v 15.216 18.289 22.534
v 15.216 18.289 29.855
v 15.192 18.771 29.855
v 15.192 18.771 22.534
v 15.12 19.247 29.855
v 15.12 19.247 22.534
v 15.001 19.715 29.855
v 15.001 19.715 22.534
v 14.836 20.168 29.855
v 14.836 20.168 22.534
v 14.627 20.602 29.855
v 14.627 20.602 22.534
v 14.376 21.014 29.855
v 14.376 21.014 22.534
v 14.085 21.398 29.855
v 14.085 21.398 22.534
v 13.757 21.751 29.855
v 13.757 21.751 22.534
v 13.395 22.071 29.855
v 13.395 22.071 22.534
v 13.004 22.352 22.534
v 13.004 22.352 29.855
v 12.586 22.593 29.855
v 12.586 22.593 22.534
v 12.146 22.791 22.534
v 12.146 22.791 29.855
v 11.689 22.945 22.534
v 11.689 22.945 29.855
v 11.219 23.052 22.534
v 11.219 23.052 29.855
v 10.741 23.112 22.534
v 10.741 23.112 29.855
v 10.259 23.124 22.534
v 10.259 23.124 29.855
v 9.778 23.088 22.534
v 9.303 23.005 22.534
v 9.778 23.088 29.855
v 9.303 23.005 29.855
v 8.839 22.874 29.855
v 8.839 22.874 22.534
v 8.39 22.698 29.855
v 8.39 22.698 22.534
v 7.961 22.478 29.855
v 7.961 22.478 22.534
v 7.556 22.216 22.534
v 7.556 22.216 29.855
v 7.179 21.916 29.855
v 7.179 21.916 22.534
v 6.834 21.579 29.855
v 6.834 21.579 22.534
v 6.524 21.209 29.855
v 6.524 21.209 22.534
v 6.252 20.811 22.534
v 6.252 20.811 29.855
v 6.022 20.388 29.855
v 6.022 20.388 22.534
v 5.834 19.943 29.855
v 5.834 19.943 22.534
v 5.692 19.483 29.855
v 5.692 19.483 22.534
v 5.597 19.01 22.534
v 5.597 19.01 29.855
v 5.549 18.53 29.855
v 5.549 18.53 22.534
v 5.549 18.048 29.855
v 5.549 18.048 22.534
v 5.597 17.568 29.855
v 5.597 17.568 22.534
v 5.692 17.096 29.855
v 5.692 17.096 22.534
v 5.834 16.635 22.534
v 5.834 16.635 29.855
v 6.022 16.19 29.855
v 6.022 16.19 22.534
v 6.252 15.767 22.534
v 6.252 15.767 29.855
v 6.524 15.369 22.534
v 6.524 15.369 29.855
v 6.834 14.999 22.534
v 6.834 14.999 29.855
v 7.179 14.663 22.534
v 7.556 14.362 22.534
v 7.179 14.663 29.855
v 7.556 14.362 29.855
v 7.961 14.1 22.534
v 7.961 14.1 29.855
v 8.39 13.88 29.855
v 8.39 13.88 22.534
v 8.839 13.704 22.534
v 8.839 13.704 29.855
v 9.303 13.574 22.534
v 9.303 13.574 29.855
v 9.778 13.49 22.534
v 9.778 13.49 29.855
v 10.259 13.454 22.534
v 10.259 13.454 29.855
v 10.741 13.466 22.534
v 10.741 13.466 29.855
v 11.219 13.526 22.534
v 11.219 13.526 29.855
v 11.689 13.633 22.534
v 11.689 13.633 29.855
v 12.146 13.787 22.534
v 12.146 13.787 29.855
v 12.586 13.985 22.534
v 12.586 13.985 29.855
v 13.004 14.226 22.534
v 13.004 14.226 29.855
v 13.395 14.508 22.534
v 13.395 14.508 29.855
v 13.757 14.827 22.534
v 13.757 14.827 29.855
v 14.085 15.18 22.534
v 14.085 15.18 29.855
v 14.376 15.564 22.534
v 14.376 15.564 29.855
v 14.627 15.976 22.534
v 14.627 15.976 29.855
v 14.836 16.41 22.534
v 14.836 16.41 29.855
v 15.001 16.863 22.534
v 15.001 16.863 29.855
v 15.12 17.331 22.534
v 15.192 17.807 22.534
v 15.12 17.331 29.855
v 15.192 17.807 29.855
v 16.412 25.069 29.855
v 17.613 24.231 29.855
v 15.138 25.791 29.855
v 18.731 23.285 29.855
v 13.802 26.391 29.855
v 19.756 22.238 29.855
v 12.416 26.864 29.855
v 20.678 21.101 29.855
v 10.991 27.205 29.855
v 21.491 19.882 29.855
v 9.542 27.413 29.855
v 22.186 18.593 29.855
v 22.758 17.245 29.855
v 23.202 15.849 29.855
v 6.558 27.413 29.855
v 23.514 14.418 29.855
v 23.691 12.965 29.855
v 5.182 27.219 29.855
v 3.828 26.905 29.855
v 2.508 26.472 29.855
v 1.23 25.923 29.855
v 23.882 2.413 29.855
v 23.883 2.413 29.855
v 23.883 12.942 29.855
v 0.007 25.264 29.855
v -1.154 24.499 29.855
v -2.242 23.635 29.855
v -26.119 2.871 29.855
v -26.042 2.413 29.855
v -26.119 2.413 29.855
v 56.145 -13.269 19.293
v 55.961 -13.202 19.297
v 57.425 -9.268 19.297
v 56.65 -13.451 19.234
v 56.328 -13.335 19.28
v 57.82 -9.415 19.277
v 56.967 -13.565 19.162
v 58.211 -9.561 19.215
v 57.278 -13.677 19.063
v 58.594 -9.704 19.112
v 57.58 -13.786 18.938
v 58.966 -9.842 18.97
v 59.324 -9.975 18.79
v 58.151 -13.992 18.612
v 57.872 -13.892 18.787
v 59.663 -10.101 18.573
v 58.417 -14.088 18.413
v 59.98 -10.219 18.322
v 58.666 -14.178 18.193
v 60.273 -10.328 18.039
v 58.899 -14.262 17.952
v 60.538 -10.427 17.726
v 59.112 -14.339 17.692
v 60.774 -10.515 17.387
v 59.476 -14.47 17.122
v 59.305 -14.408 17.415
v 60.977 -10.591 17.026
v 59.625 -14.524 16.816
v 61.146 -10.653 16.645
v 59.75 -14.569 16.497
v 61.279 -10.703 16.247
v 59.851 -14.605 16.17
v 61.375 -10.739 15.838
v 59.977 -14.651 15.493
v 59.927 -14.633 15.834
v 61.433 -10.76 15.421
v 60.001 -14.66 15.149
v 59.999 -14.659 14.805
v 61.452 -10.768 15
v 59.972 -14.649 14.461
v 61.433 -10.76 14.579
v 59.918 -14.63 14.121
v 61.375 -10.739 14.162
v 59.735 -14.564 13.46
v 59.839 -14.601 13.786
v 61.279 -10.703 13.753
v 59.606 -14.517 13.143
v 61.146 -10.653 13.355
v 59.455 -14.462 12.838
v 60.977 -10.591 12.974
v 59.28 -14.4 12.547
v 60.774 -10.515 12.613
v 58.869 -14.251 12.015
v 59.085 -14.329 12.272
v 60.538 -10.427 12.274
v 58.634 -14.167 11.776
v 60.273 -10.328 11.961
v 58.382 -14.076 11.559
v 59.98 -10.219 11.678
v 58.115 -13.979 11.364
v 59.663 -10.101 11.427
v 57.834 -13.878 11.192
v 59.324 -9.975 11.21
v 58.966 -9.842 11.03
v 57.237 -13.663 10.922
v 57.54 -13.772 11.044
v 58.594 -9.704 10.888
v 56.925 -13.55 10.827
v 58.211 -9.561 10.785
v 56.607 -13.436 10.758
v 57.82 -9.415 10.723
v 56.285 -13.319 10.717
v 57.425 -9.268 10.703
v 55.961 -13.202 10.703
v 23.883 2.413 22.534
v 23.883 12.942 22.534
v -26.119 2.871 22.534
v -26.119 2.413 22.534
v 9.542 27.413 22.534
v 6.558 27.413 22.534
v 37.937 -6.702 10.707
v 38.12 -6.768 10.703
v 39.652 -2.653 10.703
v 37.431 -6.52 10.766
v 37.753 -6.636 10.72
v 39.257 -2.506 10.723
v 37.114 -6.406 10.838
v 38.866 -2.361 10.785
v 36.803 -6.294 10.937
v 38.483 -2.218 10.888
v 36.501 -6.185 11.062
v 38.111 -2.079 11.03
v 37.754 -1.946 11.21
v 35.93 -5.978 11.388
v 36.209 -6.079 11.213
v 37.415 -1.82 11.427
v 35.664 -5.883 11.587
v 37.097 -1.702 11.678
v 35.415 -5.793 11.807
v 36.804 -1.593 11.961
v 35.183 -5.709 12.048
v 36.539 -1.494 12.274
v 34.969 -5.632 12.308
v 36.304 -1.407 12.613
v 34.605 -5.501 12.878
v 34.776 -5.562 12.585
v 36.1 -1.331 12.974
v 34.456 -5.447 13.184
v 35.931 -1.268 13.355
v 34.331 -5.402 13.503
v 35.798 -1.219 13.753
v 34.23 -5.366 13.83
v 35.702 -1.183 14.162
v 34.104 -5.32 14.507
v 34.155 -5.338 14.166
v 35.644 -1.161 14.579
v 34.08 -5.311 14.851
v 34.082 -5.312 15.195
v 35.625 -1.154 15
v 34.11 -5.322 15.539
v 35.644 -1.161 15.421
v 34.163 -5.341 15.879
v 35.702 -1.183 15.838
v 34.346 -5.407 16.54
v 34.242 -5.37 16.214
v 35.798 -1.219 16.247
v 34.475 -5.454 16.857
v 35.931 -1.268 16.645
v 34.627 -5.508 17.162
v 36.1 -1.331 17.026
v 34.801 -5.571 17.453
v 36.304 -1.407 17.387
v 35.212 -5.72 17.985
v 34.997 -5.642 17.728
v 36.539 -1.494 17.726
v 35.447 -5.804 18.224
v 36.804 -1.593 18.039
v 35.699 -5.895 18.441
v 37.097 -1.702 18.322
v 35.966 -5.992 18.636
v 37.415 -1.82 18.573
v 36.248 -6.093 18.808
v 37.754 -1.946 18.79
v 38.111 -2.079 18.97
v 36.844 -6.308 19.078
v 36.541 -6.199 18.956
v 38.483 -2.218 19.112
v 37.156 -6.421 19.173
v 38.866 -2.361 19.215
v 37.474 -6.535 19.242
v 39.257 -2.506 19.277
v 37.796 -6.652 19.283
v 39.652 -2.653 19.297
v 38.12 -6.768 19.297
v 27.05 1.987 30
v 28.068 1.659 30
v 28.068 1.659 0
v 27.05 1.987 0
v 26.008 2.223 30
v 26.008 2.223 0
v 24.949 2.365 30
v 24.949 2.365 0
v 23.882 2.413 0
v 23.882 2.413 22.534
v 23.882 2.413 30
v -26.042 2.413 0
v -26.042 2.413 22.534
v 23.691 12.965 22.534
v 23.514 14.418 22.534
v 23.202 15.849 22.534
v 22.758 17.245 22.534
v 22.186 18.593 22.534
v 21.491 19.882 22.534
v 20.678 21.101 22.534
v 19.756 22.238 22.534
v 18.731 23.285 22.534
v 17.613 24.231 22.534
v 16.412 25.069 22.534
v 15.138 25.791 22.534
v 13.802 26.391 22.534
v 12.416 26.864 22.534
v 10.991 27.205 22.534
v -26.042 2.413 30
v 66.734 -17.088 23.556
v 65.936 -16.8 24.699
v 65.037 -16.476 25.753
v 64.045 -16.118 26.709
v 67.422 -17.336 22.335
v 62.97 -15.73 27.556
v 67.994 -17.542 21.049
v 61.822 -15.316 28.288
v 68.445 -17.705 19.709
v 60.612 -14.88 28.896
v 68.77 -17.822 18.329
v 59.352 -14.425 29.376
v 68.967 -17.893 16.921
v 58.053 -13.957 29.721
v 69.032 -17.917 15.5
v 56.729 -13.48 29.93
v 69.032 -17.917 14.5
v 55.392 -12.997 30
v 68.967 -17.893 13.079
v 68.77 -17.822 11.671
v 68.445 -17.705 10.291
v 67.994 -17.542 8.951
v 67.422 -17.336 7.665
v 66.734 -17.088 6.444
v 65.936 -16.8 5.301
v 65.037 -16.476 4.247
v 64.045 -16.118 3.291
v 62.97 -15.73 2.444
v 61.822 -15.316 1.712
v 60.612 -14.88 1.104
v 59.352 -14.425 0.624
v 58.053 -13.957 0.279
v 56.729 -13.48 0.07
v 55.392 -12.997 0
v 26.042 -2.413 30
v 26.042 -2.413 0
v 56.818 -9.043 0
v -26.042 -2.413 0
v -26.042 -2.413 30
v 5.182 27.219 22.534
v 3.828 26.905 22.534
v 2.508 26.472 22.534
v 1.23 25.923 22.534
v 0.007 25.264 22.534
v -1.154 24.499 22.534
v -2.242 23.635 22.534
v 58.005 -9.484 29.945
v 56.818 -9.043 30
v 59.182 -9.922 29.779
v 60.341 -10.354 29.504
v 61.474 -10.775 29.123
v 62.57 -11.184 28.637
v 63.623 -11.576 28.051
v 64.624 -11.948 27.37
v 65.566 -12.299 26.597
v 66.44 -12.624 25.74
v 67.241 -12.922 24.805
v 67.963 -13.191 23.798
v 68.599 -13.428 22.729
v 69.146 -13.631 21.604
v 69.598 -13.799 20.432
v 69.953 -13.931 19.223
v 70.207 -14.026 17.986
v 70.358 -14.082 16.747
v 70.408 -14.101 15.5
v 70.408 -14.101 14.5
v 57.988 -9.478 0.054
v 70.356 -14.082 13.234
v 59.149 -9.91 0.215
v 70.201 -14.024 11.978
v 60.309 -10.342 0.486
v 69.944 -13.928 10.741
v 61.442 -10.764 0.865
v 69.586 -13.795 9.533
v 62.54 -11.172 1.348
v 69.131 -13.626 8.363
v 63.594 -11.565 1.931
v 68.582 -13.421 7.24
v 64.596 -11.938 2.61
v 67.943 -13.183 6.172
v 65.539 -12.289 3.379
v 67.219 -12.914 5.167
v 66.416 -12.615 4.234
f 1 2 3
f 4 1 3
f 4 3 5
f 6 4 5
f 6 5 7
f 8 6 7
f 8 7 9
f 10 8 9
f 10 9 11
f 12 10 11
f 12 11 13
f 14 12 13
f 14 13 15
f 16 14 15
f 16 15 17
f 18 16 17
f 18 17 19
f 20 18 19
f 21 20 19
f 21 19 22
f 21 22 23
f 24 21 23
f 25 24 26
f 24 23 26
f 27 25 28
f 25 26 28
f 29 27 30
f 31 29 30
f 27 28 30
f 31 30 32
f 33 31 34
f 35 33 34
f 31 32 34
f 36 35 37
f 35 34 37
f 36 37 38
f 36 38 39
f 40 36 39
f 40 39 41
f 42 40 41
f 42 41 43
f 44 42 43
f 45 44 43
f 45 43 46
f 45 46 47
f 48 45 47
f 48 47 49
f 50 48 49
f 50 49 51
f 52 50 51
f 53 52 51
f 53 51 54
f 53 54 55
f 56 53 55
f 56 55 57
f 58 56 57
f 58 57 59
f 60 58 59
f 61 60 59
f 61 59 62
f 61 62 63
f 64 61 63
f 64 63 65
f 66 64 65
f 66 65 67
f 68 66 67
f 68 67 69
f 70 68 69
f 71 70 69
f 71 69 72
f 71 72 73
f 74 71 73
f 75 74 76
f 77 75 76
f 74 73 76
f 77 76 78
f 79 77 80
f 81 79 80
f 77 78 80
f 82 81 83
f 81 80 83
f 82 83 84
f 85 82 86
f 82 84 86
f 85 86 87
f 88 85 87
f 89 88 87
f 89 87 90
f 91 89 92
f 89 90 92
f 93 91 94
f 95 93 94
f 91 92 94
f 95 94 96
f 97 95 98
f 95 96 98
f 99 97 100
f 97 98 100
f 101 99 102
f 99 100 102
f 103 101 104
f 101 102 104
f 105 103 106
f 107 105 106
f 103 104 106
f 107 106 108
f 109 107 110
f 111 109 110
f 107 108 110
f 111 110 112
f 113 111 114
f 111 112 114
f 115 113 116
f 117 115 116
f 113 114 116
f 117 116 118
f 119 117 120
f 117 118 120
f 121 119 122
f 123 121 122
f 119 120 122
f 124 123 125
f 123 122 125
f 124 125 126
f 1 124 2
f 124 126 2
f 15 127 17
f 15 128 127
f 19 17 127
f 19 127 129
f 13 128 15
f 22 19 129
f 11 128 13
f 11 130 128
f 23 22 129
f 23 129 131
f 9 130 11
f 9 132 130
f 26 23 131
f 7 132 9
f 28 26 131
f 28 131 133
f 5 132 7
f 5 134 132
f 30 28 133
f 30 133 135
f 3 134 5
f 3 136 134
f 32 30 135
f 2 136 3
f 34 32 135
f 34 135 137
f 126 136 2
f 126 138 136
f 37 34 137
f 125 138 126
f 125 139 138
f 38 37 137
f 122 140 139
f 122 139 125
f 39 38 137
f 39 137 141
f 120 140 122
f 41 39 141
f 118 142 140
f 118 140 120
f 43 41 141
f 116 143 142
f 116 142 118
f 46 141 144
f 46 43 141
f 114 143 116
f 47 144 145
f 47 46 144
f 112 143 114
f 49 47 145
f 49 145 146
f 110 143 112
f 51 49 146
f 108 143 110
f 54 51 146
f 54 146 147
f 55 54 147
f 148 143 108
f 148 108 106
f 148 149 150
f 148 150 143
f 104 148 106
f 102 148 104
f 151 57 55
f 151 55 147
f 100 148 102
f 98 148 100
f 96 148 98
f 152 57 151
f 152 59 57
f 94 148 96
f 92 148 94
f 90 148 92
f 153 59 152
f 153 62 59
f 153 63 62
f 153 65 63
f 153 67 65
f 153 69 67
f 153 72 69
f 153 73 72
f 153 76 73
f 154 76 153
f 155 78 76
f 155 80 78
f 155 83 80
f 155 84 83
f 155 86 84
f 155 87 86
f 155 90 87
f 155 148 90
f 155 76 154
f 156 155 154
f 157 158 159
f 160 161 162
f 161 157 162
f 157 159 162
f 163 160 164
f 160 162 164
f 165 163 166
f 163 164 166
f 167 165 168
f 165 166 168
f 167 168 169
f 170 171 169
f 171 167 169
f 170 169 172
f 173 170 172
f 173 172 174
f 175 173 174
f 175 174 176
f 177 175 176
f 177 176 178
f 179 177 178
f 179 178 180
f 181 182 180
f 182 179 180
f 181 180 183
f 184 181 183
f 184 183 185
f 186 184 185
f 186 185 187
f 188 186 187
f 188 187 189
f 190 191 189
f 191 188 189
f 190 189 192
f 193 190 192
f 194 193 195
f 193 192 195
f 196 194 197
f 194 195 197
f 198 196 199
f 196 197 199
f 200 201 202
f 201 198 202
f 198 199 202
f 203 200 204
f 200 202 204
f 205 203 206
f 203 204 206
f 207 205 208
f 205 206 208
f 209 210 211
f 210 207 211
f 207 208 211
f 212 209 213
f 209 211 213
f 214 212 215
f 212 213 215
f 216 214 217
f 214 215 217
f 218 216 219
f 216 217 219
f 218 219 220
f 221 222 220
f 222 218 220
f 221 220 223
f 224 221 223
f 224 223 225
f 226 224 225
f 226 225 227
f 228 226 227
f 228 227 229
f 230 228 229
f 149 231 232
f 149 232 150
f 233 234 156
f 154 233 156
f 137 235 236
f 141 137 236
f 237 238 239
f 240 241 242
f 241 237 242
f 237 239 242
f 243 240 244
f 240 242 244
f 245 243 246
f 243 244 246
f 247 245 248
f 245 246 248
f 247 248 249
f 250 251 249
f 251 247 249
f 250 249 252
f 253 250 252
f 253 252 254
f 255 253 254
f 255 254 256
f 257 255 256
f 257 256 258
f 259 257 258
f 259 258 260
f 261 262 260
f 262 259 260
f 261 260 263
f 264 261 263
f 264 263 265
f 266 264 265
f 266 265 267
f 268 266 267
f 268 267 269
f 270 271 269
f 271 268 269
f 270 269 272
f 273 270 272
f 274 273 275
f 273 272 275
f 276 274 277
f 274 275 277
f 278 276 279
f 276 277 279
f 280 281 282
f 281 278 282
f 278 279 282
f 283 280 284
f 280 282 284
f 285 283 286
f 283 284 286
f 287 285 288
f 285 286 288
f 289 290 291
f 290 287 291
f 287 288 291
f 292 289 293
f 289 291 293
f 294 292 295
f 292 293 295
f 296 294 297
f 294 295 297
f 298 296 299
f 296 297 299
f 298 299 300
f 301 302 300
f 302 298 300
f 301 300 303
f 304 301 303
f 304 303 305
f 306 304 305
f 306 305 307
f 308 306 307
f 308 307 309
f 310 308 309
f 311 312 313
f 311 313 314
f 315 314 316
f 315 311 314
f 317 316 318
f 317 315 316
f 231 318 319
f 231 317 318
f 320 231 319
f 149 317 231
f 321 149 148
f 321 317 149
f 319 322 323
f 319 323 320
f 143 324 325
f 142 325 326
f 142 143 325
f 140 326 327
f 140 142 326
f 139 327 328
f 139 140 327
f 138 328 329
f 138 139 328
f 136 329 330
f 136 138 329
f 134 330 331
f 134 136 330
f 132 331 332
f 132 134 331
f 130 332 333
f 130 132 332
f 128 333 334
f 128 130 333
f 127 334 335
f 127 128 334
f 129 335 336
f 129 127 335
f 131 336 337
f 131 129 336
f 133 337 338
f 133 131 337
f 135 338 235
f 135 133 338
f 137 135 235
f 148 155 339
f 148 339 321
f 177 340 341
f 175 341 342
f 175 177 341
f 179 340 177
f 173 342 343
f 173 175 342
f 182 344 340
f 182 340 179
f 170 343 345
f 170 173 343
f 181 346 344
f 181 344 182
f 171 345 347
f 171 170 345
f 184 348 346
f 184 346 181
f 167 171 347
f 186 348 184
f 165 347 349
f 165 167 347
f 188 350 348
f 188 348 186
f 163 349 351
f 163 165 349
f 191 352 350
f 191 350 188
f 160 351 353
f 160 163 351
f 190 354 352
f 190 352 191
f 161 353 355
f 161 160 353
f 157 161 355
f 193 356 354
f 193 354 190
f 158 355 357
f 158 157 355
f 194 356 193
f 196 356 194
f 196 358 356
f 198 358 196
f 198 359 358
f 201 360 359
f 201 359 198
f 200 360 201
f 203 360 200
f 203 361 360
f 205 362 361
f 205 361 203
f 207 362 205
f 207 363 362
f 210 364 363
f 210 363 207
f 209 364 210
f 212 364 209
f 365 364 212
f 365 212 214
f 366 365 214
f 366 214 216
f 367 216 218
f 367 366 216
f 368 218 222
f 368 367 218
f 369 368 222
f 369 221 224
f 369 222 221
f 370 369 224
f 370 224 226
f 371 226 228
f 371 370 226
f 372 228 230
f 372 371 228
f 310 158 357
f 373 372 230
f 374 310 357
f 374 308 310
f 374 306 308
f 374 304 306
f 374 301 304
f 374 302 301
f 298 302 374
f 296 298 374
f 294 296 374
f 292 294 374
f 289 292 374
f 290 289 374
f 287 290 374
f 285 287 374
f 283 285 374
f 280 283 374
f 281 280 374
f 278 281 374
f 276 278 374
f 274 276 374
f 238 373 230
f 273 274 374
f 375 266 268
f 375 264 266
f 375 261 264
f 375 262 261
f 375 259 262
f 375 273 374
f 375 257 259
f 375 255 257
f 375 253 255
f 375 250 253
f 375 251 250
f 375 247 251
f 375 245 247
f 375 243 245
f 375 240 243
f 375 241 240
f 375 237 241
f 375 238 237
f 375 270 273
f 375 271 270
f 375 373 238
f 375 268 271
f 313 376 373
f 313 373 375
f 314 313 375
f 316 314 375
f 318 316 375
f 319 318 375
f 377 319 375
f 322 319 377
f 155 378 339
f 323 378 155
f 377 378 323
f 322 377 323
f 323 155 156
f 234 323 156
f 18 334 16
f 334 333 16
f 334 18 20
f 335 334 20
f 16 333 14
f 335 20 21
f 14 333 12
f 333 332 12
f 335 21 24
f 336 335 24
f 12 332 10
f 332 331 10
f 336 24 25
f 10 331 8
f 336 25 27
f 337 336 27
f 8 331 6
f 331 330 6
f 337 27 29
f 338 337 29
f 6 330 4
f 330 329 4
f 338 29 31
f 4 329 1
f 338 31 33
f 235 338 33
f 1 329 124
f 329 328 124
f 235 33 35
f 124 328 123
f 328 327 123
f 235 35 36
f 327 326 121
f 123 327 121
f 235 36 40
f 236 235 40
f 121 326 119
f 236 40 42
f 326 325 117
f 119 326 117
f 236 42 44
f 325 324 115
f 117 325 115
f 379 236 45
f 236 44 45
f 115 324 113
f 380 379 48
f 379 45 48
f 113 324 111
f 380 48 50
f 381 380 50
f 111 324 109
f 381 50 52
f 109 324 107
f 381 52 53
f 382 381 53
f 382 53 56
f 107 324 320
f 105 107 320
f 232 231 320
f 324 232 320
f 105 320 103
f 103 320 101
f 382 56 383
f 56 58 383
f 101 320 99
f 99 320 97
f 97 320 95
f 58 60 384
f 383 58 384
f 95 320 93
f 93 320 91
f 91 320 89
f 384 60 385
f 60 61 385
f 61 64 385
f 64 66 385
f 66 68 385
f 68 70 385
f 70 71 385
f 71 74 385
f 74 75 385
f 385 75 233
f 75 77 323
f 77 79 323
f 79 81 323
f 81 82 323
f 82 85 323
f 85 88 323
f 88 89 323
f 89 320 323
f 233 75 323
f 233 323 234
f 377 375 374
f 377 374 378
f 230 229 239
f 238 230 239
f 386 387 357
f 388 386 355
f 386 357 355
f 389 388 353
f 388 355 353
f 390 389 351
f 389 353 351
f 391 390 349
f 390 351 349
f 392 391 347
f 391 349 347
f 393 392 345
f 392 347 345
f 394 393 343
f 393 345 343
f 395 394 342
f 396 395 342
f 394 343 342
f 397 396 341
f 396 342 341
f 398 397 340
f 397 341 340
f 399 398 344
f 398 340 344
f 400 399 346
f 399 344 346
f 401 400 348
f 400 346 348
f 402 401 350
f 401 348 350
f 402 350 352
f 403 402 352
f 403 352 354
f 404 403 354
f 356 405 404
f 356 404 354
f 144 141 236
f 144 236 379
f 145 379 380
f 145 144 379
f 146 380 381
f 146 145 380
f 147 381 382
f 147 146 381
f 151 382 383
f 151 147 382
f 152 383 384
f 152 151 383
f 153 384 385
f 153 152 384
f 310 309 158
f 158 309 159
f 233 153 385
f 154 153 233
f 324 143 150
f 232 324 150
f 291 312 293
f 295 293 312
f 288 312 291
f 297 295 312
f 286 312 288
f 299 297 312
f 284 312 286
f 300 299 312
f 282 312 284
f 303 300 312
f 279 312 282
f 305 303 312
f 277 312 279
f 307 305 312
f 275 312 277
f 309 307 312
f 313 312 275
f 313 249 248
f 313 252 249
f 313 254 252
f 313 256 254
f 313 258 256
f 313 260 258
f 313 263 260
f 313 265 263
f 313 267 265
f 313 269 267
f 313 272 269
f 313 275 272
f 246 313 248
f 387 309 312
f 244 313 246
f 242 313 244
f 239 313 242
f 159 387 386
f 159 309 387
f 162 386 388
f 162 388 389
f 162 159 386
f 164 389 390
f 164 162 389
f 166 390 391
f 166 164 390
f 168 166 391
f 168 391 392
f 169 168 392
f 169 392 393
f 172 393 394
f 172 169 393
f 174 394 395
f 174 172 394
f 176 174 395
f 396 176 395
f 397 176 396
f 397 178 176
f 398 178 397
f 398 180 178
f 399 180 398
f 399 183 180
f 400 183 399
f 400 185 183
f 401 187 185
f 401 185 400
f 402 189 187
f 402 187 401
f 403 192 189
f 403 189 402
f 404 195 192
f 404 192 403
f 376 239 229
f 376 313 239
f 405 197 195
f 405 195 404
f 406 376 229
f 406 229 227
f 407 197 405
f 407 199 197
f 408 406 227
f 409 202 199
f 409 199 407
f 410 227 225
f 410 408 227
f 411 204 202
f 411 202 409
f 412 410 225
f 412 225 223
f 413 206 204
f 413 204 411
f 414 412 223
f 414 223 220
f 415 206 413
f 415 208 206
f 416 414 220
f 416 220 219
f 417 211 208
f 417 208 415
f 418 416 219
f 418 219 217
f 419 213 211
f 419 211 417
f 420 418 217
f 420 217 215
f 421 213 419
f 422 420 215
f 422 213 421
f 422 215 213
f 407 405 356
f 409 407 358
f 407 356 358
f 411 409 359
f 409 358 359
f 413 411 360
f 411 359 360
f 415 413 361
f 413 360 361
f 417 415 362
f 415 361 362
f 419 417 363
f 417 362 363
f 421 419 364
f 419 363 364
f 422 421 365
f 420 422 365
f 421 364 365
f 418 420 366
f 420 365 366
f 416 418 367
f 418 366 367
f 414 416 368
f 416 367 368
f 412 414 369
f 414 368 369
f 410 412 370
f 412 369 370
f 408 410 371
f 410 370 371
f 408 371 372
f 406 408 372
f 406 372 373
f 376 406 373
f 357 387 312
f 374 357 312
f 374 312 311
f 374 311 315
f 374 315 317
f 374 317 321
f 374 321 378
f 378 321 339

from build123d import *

# Parameters (mm, degrees)
PAD_DEPTH       = 30
POCKET_DEPTH    = 5
FILLET_R        = 14.5
FILLET001_R     = 14.5
FILLET002_R     = 12
SKETCH002_W     = 50.00223
SKETCH002_H     = 7.321129
PAD001_DEPTH    = 25
SKETCH003_R     = 4.8367523299
POCKET001_DEPTH = 10


with BuildPart() as part:
    # Sketch → Pad (new body)
    with BuildSketch(Plane.XY):
        Polygon((-26.0423896161, -2.4126467386), (-26.0423896161, 2.4126467386), (26.0423896161, 2.4126467386), (70.4083759206, -14.101078257), (69.0323338509, -17.9166155839), (26.0423896161, -2.4126467386), align=None)
    extrude(amount=PAD_DEPTH)

    # Sketch001 (on Face3 of Pad) → Pocket (cut)
    with BuildSketch(Plane(origin=(3.9577363848, 10.6329055553, 0), x_dir=(-0.9371842108, 0.3488348534, 0), z_dir=(0.3488348534, 0.9371842108, 0))):
        with BuildLine():
            ThreePointArc((-57.051074, 19.2972875988), (-61.3483615988, 15), (-57.051074, 10.7027124012))
            Line((-57.051074, 10.7027124012), (-38.086853, 10.7027124012))
            ThreePointArc((-38.086853, 10.7027124012), (-33.7895654012, 15), (-38.086853, 19.2972875988))
            Line((-38.086853, 19.2972875988), (-57.051074, 19.2972875988))
        make_face()
    extrude(amount=-POCKET_DEPTH, mode=Mode.SUBTRACT)

    # Fillet
    fillet_edges = [part.edges().sort_by_distance(p)[0] for p in [
        (69.720355, -16.008847, 30),
    ]]
    fillet(fillet_edges, radius=FILLET_R)

    # Fillet001
    fillet001_edges = [part.edges().sort_by_distance(p)[0] for p in [
        (69.720355, -16.008847, 0),
    ]]
    fillet(fillet001_edges, radius=FILLET001_R)

    # Fillet002
    fillet002_edges = [part.edges().sort_by_distance(p)[0] for p in [
        (26.04239, 2.412647, 15),
    ]]
    fillet(fillet002_edges, radius=FILLET002_R)

    # Sketch002 (on Face12 of Fillet002) → Pad001 (join)
    with BuildSketch(Plane(origin=(0, 2.4126467386, 0), x_dir=(-1, 0, 0), z_dir=(0, 1, 0))):
        with Locations((1.1177492, 26.194347)):
            Rectangle(SKETCH002_W, SKETCH002_H)
    extrude(amount=PAD001_DEPTH)

    # Sketch003 (on Face17 of Pad001) → Pocket001 (cut)
    with BuildSketch(Plane.XY.offset(29.8549115)):
        with Locations((10.379424, 18.289026)):
            Circle(SKETCH003_R)
        with BuildLine():
            Line((-30.0109383074, -0.5137681689), (-30.0109383074, 32.26572))
            Line((31.0117, 32.26572), (-30.0109383074, 32.26572))
            Line((32.17643, 11.966219), (31.0117, 32.26572))
            Line((23.690575, 12.964556), (32.17643, 11.966219))
            ThreePointArc((23.690575, 12.964556), (14.0178466447, 26.3039488372), (-2.2418022126, 23.6346991039))
            Line((-2.2418022126, 23.6346991039), (-30.0109383074, -0.5137681689))
        make_face()
    extrude(amount=-POCKET001_DEPTH, mode=Mode.SUBTRACT)


solid = part.part
